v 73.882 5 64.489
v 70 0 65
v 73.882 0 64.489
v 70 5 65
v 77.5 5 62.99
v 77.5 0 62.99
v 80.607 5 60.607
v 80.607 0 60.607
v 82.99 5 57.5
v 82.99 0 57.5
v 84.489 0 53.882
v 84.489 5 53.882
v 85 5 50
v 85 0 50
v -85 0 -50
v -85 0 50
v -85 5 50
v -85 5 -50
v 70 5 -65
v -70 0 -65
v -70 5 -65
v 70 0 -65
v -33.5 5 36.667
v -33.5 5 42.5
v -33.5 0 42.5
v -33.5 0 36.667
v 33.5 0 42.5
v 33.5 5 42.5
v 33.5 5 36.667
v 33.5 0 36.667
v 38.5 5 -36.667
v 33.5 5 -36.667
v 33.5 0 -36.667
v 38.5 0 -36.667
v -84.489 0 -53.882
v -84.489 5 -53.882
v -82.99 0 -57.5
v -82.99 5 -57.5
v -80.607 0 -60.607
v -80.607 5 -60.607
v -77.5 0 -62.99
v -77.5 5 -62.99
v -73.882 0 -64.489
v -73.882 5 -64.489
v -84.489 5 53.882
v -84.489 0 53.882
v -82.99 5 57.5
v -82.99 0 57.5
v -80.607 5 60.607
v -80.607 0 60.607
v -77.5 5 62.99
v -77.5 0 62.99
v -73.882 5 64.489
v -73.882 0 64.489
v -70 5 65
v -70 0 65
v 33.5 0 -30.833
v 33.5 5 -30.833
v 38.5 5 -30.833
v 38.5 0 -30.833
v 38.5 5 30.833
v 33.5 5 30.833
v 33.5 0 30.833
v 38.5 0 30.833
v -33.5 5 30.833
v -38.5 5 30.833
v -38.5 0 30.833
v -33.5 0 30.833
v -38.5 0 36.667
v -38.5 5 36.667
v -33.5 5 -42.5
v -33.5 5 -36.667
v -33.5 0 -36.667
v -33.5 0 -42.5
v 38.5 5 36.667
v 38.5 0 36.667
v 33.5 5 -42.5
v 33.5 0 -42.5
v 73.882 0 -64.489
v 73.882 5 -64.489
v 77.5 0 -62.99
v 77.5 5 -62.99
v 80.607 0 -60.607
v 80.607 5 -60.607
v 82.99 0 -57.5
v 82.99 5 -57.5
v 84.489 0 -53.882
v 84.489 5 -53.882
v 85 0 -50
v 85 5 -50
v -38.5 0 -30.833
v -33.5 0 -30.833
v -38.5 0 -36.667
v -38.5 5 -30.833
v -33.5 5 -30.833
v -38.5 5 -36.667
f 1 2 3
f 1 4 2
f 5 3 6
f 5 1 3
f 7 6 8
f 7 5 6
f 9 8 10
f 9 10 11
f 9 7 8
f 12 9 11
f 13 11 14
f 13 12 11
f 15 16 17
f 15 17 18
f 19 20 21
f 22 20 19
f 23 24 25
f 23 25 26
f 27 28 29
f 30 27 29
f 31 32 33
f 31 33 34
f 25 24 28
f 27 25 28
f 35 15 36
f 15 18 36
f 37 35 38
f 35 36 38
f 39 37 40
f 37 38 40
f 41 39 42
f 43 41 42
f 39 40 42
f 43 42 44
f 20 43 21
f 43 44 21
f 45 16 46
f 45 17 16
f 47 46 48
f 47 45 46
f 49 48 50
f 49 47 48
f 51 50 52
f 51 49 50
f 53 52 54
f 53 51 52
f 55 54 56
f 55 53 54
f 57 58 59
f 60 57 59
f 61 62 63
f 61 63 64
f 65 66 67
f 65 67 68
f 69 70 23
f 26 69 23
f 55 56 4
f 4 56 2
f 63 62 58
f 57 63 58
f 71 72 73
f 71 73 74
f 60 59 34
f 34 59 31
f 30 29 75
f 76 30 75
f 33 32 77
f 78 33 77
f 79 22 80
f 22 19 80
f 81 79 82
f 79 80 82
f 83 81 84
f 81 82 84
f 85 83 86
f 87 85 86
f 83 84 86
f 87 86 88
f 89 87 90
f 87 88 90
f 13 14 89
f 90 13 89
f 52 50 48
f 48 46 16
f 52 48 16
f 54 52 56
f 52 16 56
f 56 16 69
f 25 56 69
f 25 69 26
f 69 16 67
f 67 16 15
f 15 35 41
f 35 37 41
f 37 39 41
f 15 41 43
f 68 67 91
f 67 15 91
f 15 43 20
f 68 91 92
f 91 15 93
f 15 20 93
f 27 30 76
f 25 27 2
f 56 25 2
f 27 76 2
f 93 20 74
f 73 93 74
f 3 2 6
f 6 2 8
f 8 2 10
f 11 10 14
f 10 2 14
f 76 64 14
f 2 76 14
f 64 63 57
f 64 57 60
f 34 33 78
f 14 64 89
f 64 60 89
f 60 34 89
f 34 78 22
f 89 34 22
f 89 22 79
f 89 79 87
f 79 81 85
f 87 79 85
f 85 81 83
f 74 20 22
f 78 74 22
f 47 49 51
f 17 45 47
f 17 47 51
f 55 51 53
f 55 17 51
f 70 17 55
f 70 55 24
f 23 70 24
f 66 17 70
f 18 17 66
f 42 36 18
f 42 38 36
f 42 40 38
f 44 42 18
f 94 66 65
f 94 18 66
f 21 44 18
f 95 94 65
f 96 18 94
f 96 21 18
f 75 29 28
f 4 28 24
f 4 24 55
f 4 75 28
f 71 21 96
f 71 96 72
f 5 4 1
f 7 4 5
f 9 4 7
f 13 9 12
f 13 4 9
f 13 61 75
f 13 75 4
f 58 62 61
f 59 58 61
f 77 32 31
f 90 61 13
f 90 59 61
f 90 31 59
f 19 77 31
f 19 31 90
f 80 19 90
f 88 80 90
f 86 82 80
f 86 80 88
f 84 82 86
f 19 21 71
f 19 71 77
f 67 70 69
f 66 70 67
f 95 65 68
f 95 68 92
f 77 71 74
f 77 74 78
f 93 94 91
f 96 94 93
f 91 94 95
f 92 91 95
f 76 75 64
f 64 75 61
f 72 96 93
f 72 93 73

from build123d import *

# Parameters (mm, degrees)
SKETCH1_W           = 170
SKETCH1_H           = 130
BOSS_EXTRUDE1_DEPTH = 5
SKETCH2_W           = 67
SKETCH2_H           = 85
CUT_EXTRUDE1_DEPTH  = 108.121426428
SKETCH3_W           = 5
SKETCH3_H           = 5.833333
CUT_EXTRUDE2_DEPTH  = 108.121426428
FILLET1_R           = 15


with BuildPart() as part:
    # Sketch1 → Boss-Extrude1 (new body)
    with BuildSketch(Plane(origin=(0, 0, 0), x_dir=(1, 0, 0), z_dir=(0, 1, 0))):
        Rectangle(SKETCH1_W, SKETCH1_H)
    extrude(amount=BOSS_EXTRUDE1_DEPTH)

    # Sketch2 → Cut-Extrude1 (cut, through all)
    with BuildSketch(Plane(origin=(0, 5, 0), x_dir=(1, 0, 0), z_dir=(0, 1, 0))):
        Rectangle(SKETCH2_W, SKETCH2_H)
    extrude(amount=-CUT_EXTRUDE1_DEPTH, mode=Mode.SUBTRACT)

    # Sketch3 → Cut-Extrude2 (cut, through all)
    with BuildSketch(Plane(origin=(0, 5, 0), x_dir=(1, 0, 0), z_dir=(0, 1, 0))):
        with Locations((-36, -33.7500005)):
            Rectangle(SKETCH3_W, SKETCH3_H)
        with Locations((36, 33.7500005)):
            Rectangle(SKETCH3_W, SKETCH3_H)
        with Locations((-36, 33.7500005)):
            Rectangle(SKETCH3_W, SKETCH3_H)
        with Locations((36, -33.7500005)):
            Rectangle(SKETCH3_W, SKETCH3_H)
    extrude(amount=-CUT_EXTRUDE2_DEPTH, mode=Mode.SUBTRACT)

    # Fillet1
    fillet1_edges = [part.edges().sort_by_distance(p)[0] for p in [
        (85, 2.5, 65),
        (-85, 2.5, 65),
        (-85, 2.5, -65),
        (85, 2.5, -65),
    ]]
    fillet(fillet1_edges, radius=FILLET1_R)


solid = part.part
